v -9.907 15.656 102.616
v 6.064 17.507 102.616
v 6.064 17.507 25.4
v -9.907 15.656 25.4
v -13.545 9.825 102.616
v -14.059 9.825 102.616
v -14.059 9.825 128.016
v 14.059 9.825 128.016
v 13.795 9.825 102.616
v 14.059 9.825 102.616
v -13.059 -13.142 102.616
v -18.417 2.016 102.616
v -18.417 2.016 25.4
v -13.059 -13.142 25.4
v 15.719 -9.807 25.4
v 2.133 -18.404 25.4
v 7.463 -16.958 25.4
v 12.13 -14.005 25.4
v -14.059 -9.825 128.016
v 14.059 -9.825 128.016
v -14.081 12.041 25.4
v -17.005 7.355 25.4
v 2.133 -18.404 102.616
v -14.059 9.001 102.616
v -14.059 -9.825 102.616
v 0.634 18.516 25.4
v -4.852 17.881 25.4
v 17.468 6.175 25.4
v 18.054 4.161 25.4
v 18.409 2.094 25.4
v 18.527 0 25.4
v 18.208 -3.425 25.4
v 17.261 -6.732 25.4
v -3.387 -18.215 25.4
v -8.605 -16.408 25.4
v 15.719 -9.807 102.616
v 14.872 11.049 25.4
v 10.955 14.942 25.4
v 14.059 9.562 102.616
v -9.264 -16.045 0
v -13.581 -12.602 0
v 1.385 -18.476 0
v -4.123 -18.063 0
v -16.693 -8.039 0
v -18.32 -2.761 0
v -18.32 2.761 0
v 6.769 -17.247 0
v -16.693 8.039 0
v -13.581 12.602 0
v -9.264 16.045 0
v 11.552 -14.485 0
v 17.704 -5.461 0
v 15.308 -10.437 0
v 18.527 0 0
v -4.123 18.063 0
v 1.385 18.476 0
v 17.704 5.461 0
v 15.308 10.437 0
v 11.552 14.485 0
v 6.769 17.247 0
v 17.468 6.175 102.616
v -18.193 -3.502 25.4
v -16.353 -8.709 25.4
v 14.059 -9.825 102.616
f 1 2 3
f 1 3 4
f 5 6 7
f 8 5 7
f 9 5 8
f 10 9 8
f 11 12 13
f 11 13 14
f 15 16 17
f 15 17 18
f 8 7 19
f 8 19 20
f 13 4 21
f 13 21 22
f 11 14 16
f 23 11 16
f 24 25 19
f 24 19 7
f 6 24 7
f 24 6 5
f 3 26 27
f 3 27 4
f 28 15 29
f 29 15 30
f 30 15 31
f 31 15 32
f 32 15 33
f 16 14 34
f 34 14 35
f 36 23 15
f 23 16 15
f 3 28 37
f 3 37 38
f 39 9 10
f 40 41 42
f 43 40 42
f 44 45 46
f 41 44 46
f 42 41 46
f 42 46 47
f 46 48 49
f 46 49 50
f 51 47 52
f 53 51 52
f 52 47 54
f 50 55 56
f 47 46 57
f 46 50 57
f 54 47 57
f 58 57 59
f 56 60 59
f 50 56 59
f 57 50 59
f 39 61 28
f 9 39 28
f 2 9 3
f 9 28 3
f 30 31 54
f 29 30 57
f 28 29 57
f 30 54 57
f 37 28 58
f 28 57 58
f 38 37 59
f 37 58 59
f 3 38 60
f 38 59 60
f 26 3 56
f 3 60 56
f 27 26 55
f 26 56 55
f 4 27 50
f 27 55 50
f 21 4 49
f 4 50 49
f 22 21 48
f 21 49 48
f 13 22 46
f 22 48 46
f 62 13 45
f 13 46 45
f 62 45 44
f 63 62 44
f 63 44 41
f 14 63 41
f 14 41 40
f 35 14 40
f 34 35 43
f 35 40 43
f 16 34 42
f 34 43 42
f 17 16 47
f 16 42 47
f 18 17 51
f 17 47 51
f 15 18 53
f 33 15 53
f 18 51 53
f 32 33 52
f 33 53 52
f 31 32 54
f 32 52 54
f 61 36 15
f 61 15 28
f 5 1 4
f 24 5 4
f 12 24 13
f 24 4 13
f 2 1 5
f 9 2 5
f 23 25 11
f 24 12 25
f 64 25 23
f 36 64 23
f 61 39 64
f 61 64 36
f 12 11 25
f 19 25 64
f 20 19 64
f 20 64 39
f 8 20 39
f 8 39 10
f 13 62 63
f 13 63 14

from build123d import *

# Parameters (mm, degrees)
F0_R     = 18.527319
F1_DEPTH = 25.4
F3_DEPTH = 77.216
F5_W     = 28.118574
F5_H     = 19.64978
F6_DEPTH = 25.4


with BuildPart() as f1:
    # F0 (on Top) → F1 (new body)
    with BuildSketch(Plane.XY):
        Circle(F0_R)
    extrude(amount=F1_DEPTH)

    # F2 (on face) → F3 (join)
    with BuildSketch(Plane.XY.offset(25.4)):
        Polygon((6.063722, 17.506937), (-9.906806, 15.656205), (-18.417307, 2.016032), (-13.0592, -13.142255), (2.132751, -18.404156), (15.718697, -9.807352), (17.468143, 6.174588), align=None)
    extrude(amount=F3_DEPTH)

    # F5 (on face) → F6 (join)
    with BuildSketch(Plane.XY.offset(102.616)):
        Rectangle(F5_W, F5_H)
    extrude(amount=F6_DEPTH)


solid = f1.part
